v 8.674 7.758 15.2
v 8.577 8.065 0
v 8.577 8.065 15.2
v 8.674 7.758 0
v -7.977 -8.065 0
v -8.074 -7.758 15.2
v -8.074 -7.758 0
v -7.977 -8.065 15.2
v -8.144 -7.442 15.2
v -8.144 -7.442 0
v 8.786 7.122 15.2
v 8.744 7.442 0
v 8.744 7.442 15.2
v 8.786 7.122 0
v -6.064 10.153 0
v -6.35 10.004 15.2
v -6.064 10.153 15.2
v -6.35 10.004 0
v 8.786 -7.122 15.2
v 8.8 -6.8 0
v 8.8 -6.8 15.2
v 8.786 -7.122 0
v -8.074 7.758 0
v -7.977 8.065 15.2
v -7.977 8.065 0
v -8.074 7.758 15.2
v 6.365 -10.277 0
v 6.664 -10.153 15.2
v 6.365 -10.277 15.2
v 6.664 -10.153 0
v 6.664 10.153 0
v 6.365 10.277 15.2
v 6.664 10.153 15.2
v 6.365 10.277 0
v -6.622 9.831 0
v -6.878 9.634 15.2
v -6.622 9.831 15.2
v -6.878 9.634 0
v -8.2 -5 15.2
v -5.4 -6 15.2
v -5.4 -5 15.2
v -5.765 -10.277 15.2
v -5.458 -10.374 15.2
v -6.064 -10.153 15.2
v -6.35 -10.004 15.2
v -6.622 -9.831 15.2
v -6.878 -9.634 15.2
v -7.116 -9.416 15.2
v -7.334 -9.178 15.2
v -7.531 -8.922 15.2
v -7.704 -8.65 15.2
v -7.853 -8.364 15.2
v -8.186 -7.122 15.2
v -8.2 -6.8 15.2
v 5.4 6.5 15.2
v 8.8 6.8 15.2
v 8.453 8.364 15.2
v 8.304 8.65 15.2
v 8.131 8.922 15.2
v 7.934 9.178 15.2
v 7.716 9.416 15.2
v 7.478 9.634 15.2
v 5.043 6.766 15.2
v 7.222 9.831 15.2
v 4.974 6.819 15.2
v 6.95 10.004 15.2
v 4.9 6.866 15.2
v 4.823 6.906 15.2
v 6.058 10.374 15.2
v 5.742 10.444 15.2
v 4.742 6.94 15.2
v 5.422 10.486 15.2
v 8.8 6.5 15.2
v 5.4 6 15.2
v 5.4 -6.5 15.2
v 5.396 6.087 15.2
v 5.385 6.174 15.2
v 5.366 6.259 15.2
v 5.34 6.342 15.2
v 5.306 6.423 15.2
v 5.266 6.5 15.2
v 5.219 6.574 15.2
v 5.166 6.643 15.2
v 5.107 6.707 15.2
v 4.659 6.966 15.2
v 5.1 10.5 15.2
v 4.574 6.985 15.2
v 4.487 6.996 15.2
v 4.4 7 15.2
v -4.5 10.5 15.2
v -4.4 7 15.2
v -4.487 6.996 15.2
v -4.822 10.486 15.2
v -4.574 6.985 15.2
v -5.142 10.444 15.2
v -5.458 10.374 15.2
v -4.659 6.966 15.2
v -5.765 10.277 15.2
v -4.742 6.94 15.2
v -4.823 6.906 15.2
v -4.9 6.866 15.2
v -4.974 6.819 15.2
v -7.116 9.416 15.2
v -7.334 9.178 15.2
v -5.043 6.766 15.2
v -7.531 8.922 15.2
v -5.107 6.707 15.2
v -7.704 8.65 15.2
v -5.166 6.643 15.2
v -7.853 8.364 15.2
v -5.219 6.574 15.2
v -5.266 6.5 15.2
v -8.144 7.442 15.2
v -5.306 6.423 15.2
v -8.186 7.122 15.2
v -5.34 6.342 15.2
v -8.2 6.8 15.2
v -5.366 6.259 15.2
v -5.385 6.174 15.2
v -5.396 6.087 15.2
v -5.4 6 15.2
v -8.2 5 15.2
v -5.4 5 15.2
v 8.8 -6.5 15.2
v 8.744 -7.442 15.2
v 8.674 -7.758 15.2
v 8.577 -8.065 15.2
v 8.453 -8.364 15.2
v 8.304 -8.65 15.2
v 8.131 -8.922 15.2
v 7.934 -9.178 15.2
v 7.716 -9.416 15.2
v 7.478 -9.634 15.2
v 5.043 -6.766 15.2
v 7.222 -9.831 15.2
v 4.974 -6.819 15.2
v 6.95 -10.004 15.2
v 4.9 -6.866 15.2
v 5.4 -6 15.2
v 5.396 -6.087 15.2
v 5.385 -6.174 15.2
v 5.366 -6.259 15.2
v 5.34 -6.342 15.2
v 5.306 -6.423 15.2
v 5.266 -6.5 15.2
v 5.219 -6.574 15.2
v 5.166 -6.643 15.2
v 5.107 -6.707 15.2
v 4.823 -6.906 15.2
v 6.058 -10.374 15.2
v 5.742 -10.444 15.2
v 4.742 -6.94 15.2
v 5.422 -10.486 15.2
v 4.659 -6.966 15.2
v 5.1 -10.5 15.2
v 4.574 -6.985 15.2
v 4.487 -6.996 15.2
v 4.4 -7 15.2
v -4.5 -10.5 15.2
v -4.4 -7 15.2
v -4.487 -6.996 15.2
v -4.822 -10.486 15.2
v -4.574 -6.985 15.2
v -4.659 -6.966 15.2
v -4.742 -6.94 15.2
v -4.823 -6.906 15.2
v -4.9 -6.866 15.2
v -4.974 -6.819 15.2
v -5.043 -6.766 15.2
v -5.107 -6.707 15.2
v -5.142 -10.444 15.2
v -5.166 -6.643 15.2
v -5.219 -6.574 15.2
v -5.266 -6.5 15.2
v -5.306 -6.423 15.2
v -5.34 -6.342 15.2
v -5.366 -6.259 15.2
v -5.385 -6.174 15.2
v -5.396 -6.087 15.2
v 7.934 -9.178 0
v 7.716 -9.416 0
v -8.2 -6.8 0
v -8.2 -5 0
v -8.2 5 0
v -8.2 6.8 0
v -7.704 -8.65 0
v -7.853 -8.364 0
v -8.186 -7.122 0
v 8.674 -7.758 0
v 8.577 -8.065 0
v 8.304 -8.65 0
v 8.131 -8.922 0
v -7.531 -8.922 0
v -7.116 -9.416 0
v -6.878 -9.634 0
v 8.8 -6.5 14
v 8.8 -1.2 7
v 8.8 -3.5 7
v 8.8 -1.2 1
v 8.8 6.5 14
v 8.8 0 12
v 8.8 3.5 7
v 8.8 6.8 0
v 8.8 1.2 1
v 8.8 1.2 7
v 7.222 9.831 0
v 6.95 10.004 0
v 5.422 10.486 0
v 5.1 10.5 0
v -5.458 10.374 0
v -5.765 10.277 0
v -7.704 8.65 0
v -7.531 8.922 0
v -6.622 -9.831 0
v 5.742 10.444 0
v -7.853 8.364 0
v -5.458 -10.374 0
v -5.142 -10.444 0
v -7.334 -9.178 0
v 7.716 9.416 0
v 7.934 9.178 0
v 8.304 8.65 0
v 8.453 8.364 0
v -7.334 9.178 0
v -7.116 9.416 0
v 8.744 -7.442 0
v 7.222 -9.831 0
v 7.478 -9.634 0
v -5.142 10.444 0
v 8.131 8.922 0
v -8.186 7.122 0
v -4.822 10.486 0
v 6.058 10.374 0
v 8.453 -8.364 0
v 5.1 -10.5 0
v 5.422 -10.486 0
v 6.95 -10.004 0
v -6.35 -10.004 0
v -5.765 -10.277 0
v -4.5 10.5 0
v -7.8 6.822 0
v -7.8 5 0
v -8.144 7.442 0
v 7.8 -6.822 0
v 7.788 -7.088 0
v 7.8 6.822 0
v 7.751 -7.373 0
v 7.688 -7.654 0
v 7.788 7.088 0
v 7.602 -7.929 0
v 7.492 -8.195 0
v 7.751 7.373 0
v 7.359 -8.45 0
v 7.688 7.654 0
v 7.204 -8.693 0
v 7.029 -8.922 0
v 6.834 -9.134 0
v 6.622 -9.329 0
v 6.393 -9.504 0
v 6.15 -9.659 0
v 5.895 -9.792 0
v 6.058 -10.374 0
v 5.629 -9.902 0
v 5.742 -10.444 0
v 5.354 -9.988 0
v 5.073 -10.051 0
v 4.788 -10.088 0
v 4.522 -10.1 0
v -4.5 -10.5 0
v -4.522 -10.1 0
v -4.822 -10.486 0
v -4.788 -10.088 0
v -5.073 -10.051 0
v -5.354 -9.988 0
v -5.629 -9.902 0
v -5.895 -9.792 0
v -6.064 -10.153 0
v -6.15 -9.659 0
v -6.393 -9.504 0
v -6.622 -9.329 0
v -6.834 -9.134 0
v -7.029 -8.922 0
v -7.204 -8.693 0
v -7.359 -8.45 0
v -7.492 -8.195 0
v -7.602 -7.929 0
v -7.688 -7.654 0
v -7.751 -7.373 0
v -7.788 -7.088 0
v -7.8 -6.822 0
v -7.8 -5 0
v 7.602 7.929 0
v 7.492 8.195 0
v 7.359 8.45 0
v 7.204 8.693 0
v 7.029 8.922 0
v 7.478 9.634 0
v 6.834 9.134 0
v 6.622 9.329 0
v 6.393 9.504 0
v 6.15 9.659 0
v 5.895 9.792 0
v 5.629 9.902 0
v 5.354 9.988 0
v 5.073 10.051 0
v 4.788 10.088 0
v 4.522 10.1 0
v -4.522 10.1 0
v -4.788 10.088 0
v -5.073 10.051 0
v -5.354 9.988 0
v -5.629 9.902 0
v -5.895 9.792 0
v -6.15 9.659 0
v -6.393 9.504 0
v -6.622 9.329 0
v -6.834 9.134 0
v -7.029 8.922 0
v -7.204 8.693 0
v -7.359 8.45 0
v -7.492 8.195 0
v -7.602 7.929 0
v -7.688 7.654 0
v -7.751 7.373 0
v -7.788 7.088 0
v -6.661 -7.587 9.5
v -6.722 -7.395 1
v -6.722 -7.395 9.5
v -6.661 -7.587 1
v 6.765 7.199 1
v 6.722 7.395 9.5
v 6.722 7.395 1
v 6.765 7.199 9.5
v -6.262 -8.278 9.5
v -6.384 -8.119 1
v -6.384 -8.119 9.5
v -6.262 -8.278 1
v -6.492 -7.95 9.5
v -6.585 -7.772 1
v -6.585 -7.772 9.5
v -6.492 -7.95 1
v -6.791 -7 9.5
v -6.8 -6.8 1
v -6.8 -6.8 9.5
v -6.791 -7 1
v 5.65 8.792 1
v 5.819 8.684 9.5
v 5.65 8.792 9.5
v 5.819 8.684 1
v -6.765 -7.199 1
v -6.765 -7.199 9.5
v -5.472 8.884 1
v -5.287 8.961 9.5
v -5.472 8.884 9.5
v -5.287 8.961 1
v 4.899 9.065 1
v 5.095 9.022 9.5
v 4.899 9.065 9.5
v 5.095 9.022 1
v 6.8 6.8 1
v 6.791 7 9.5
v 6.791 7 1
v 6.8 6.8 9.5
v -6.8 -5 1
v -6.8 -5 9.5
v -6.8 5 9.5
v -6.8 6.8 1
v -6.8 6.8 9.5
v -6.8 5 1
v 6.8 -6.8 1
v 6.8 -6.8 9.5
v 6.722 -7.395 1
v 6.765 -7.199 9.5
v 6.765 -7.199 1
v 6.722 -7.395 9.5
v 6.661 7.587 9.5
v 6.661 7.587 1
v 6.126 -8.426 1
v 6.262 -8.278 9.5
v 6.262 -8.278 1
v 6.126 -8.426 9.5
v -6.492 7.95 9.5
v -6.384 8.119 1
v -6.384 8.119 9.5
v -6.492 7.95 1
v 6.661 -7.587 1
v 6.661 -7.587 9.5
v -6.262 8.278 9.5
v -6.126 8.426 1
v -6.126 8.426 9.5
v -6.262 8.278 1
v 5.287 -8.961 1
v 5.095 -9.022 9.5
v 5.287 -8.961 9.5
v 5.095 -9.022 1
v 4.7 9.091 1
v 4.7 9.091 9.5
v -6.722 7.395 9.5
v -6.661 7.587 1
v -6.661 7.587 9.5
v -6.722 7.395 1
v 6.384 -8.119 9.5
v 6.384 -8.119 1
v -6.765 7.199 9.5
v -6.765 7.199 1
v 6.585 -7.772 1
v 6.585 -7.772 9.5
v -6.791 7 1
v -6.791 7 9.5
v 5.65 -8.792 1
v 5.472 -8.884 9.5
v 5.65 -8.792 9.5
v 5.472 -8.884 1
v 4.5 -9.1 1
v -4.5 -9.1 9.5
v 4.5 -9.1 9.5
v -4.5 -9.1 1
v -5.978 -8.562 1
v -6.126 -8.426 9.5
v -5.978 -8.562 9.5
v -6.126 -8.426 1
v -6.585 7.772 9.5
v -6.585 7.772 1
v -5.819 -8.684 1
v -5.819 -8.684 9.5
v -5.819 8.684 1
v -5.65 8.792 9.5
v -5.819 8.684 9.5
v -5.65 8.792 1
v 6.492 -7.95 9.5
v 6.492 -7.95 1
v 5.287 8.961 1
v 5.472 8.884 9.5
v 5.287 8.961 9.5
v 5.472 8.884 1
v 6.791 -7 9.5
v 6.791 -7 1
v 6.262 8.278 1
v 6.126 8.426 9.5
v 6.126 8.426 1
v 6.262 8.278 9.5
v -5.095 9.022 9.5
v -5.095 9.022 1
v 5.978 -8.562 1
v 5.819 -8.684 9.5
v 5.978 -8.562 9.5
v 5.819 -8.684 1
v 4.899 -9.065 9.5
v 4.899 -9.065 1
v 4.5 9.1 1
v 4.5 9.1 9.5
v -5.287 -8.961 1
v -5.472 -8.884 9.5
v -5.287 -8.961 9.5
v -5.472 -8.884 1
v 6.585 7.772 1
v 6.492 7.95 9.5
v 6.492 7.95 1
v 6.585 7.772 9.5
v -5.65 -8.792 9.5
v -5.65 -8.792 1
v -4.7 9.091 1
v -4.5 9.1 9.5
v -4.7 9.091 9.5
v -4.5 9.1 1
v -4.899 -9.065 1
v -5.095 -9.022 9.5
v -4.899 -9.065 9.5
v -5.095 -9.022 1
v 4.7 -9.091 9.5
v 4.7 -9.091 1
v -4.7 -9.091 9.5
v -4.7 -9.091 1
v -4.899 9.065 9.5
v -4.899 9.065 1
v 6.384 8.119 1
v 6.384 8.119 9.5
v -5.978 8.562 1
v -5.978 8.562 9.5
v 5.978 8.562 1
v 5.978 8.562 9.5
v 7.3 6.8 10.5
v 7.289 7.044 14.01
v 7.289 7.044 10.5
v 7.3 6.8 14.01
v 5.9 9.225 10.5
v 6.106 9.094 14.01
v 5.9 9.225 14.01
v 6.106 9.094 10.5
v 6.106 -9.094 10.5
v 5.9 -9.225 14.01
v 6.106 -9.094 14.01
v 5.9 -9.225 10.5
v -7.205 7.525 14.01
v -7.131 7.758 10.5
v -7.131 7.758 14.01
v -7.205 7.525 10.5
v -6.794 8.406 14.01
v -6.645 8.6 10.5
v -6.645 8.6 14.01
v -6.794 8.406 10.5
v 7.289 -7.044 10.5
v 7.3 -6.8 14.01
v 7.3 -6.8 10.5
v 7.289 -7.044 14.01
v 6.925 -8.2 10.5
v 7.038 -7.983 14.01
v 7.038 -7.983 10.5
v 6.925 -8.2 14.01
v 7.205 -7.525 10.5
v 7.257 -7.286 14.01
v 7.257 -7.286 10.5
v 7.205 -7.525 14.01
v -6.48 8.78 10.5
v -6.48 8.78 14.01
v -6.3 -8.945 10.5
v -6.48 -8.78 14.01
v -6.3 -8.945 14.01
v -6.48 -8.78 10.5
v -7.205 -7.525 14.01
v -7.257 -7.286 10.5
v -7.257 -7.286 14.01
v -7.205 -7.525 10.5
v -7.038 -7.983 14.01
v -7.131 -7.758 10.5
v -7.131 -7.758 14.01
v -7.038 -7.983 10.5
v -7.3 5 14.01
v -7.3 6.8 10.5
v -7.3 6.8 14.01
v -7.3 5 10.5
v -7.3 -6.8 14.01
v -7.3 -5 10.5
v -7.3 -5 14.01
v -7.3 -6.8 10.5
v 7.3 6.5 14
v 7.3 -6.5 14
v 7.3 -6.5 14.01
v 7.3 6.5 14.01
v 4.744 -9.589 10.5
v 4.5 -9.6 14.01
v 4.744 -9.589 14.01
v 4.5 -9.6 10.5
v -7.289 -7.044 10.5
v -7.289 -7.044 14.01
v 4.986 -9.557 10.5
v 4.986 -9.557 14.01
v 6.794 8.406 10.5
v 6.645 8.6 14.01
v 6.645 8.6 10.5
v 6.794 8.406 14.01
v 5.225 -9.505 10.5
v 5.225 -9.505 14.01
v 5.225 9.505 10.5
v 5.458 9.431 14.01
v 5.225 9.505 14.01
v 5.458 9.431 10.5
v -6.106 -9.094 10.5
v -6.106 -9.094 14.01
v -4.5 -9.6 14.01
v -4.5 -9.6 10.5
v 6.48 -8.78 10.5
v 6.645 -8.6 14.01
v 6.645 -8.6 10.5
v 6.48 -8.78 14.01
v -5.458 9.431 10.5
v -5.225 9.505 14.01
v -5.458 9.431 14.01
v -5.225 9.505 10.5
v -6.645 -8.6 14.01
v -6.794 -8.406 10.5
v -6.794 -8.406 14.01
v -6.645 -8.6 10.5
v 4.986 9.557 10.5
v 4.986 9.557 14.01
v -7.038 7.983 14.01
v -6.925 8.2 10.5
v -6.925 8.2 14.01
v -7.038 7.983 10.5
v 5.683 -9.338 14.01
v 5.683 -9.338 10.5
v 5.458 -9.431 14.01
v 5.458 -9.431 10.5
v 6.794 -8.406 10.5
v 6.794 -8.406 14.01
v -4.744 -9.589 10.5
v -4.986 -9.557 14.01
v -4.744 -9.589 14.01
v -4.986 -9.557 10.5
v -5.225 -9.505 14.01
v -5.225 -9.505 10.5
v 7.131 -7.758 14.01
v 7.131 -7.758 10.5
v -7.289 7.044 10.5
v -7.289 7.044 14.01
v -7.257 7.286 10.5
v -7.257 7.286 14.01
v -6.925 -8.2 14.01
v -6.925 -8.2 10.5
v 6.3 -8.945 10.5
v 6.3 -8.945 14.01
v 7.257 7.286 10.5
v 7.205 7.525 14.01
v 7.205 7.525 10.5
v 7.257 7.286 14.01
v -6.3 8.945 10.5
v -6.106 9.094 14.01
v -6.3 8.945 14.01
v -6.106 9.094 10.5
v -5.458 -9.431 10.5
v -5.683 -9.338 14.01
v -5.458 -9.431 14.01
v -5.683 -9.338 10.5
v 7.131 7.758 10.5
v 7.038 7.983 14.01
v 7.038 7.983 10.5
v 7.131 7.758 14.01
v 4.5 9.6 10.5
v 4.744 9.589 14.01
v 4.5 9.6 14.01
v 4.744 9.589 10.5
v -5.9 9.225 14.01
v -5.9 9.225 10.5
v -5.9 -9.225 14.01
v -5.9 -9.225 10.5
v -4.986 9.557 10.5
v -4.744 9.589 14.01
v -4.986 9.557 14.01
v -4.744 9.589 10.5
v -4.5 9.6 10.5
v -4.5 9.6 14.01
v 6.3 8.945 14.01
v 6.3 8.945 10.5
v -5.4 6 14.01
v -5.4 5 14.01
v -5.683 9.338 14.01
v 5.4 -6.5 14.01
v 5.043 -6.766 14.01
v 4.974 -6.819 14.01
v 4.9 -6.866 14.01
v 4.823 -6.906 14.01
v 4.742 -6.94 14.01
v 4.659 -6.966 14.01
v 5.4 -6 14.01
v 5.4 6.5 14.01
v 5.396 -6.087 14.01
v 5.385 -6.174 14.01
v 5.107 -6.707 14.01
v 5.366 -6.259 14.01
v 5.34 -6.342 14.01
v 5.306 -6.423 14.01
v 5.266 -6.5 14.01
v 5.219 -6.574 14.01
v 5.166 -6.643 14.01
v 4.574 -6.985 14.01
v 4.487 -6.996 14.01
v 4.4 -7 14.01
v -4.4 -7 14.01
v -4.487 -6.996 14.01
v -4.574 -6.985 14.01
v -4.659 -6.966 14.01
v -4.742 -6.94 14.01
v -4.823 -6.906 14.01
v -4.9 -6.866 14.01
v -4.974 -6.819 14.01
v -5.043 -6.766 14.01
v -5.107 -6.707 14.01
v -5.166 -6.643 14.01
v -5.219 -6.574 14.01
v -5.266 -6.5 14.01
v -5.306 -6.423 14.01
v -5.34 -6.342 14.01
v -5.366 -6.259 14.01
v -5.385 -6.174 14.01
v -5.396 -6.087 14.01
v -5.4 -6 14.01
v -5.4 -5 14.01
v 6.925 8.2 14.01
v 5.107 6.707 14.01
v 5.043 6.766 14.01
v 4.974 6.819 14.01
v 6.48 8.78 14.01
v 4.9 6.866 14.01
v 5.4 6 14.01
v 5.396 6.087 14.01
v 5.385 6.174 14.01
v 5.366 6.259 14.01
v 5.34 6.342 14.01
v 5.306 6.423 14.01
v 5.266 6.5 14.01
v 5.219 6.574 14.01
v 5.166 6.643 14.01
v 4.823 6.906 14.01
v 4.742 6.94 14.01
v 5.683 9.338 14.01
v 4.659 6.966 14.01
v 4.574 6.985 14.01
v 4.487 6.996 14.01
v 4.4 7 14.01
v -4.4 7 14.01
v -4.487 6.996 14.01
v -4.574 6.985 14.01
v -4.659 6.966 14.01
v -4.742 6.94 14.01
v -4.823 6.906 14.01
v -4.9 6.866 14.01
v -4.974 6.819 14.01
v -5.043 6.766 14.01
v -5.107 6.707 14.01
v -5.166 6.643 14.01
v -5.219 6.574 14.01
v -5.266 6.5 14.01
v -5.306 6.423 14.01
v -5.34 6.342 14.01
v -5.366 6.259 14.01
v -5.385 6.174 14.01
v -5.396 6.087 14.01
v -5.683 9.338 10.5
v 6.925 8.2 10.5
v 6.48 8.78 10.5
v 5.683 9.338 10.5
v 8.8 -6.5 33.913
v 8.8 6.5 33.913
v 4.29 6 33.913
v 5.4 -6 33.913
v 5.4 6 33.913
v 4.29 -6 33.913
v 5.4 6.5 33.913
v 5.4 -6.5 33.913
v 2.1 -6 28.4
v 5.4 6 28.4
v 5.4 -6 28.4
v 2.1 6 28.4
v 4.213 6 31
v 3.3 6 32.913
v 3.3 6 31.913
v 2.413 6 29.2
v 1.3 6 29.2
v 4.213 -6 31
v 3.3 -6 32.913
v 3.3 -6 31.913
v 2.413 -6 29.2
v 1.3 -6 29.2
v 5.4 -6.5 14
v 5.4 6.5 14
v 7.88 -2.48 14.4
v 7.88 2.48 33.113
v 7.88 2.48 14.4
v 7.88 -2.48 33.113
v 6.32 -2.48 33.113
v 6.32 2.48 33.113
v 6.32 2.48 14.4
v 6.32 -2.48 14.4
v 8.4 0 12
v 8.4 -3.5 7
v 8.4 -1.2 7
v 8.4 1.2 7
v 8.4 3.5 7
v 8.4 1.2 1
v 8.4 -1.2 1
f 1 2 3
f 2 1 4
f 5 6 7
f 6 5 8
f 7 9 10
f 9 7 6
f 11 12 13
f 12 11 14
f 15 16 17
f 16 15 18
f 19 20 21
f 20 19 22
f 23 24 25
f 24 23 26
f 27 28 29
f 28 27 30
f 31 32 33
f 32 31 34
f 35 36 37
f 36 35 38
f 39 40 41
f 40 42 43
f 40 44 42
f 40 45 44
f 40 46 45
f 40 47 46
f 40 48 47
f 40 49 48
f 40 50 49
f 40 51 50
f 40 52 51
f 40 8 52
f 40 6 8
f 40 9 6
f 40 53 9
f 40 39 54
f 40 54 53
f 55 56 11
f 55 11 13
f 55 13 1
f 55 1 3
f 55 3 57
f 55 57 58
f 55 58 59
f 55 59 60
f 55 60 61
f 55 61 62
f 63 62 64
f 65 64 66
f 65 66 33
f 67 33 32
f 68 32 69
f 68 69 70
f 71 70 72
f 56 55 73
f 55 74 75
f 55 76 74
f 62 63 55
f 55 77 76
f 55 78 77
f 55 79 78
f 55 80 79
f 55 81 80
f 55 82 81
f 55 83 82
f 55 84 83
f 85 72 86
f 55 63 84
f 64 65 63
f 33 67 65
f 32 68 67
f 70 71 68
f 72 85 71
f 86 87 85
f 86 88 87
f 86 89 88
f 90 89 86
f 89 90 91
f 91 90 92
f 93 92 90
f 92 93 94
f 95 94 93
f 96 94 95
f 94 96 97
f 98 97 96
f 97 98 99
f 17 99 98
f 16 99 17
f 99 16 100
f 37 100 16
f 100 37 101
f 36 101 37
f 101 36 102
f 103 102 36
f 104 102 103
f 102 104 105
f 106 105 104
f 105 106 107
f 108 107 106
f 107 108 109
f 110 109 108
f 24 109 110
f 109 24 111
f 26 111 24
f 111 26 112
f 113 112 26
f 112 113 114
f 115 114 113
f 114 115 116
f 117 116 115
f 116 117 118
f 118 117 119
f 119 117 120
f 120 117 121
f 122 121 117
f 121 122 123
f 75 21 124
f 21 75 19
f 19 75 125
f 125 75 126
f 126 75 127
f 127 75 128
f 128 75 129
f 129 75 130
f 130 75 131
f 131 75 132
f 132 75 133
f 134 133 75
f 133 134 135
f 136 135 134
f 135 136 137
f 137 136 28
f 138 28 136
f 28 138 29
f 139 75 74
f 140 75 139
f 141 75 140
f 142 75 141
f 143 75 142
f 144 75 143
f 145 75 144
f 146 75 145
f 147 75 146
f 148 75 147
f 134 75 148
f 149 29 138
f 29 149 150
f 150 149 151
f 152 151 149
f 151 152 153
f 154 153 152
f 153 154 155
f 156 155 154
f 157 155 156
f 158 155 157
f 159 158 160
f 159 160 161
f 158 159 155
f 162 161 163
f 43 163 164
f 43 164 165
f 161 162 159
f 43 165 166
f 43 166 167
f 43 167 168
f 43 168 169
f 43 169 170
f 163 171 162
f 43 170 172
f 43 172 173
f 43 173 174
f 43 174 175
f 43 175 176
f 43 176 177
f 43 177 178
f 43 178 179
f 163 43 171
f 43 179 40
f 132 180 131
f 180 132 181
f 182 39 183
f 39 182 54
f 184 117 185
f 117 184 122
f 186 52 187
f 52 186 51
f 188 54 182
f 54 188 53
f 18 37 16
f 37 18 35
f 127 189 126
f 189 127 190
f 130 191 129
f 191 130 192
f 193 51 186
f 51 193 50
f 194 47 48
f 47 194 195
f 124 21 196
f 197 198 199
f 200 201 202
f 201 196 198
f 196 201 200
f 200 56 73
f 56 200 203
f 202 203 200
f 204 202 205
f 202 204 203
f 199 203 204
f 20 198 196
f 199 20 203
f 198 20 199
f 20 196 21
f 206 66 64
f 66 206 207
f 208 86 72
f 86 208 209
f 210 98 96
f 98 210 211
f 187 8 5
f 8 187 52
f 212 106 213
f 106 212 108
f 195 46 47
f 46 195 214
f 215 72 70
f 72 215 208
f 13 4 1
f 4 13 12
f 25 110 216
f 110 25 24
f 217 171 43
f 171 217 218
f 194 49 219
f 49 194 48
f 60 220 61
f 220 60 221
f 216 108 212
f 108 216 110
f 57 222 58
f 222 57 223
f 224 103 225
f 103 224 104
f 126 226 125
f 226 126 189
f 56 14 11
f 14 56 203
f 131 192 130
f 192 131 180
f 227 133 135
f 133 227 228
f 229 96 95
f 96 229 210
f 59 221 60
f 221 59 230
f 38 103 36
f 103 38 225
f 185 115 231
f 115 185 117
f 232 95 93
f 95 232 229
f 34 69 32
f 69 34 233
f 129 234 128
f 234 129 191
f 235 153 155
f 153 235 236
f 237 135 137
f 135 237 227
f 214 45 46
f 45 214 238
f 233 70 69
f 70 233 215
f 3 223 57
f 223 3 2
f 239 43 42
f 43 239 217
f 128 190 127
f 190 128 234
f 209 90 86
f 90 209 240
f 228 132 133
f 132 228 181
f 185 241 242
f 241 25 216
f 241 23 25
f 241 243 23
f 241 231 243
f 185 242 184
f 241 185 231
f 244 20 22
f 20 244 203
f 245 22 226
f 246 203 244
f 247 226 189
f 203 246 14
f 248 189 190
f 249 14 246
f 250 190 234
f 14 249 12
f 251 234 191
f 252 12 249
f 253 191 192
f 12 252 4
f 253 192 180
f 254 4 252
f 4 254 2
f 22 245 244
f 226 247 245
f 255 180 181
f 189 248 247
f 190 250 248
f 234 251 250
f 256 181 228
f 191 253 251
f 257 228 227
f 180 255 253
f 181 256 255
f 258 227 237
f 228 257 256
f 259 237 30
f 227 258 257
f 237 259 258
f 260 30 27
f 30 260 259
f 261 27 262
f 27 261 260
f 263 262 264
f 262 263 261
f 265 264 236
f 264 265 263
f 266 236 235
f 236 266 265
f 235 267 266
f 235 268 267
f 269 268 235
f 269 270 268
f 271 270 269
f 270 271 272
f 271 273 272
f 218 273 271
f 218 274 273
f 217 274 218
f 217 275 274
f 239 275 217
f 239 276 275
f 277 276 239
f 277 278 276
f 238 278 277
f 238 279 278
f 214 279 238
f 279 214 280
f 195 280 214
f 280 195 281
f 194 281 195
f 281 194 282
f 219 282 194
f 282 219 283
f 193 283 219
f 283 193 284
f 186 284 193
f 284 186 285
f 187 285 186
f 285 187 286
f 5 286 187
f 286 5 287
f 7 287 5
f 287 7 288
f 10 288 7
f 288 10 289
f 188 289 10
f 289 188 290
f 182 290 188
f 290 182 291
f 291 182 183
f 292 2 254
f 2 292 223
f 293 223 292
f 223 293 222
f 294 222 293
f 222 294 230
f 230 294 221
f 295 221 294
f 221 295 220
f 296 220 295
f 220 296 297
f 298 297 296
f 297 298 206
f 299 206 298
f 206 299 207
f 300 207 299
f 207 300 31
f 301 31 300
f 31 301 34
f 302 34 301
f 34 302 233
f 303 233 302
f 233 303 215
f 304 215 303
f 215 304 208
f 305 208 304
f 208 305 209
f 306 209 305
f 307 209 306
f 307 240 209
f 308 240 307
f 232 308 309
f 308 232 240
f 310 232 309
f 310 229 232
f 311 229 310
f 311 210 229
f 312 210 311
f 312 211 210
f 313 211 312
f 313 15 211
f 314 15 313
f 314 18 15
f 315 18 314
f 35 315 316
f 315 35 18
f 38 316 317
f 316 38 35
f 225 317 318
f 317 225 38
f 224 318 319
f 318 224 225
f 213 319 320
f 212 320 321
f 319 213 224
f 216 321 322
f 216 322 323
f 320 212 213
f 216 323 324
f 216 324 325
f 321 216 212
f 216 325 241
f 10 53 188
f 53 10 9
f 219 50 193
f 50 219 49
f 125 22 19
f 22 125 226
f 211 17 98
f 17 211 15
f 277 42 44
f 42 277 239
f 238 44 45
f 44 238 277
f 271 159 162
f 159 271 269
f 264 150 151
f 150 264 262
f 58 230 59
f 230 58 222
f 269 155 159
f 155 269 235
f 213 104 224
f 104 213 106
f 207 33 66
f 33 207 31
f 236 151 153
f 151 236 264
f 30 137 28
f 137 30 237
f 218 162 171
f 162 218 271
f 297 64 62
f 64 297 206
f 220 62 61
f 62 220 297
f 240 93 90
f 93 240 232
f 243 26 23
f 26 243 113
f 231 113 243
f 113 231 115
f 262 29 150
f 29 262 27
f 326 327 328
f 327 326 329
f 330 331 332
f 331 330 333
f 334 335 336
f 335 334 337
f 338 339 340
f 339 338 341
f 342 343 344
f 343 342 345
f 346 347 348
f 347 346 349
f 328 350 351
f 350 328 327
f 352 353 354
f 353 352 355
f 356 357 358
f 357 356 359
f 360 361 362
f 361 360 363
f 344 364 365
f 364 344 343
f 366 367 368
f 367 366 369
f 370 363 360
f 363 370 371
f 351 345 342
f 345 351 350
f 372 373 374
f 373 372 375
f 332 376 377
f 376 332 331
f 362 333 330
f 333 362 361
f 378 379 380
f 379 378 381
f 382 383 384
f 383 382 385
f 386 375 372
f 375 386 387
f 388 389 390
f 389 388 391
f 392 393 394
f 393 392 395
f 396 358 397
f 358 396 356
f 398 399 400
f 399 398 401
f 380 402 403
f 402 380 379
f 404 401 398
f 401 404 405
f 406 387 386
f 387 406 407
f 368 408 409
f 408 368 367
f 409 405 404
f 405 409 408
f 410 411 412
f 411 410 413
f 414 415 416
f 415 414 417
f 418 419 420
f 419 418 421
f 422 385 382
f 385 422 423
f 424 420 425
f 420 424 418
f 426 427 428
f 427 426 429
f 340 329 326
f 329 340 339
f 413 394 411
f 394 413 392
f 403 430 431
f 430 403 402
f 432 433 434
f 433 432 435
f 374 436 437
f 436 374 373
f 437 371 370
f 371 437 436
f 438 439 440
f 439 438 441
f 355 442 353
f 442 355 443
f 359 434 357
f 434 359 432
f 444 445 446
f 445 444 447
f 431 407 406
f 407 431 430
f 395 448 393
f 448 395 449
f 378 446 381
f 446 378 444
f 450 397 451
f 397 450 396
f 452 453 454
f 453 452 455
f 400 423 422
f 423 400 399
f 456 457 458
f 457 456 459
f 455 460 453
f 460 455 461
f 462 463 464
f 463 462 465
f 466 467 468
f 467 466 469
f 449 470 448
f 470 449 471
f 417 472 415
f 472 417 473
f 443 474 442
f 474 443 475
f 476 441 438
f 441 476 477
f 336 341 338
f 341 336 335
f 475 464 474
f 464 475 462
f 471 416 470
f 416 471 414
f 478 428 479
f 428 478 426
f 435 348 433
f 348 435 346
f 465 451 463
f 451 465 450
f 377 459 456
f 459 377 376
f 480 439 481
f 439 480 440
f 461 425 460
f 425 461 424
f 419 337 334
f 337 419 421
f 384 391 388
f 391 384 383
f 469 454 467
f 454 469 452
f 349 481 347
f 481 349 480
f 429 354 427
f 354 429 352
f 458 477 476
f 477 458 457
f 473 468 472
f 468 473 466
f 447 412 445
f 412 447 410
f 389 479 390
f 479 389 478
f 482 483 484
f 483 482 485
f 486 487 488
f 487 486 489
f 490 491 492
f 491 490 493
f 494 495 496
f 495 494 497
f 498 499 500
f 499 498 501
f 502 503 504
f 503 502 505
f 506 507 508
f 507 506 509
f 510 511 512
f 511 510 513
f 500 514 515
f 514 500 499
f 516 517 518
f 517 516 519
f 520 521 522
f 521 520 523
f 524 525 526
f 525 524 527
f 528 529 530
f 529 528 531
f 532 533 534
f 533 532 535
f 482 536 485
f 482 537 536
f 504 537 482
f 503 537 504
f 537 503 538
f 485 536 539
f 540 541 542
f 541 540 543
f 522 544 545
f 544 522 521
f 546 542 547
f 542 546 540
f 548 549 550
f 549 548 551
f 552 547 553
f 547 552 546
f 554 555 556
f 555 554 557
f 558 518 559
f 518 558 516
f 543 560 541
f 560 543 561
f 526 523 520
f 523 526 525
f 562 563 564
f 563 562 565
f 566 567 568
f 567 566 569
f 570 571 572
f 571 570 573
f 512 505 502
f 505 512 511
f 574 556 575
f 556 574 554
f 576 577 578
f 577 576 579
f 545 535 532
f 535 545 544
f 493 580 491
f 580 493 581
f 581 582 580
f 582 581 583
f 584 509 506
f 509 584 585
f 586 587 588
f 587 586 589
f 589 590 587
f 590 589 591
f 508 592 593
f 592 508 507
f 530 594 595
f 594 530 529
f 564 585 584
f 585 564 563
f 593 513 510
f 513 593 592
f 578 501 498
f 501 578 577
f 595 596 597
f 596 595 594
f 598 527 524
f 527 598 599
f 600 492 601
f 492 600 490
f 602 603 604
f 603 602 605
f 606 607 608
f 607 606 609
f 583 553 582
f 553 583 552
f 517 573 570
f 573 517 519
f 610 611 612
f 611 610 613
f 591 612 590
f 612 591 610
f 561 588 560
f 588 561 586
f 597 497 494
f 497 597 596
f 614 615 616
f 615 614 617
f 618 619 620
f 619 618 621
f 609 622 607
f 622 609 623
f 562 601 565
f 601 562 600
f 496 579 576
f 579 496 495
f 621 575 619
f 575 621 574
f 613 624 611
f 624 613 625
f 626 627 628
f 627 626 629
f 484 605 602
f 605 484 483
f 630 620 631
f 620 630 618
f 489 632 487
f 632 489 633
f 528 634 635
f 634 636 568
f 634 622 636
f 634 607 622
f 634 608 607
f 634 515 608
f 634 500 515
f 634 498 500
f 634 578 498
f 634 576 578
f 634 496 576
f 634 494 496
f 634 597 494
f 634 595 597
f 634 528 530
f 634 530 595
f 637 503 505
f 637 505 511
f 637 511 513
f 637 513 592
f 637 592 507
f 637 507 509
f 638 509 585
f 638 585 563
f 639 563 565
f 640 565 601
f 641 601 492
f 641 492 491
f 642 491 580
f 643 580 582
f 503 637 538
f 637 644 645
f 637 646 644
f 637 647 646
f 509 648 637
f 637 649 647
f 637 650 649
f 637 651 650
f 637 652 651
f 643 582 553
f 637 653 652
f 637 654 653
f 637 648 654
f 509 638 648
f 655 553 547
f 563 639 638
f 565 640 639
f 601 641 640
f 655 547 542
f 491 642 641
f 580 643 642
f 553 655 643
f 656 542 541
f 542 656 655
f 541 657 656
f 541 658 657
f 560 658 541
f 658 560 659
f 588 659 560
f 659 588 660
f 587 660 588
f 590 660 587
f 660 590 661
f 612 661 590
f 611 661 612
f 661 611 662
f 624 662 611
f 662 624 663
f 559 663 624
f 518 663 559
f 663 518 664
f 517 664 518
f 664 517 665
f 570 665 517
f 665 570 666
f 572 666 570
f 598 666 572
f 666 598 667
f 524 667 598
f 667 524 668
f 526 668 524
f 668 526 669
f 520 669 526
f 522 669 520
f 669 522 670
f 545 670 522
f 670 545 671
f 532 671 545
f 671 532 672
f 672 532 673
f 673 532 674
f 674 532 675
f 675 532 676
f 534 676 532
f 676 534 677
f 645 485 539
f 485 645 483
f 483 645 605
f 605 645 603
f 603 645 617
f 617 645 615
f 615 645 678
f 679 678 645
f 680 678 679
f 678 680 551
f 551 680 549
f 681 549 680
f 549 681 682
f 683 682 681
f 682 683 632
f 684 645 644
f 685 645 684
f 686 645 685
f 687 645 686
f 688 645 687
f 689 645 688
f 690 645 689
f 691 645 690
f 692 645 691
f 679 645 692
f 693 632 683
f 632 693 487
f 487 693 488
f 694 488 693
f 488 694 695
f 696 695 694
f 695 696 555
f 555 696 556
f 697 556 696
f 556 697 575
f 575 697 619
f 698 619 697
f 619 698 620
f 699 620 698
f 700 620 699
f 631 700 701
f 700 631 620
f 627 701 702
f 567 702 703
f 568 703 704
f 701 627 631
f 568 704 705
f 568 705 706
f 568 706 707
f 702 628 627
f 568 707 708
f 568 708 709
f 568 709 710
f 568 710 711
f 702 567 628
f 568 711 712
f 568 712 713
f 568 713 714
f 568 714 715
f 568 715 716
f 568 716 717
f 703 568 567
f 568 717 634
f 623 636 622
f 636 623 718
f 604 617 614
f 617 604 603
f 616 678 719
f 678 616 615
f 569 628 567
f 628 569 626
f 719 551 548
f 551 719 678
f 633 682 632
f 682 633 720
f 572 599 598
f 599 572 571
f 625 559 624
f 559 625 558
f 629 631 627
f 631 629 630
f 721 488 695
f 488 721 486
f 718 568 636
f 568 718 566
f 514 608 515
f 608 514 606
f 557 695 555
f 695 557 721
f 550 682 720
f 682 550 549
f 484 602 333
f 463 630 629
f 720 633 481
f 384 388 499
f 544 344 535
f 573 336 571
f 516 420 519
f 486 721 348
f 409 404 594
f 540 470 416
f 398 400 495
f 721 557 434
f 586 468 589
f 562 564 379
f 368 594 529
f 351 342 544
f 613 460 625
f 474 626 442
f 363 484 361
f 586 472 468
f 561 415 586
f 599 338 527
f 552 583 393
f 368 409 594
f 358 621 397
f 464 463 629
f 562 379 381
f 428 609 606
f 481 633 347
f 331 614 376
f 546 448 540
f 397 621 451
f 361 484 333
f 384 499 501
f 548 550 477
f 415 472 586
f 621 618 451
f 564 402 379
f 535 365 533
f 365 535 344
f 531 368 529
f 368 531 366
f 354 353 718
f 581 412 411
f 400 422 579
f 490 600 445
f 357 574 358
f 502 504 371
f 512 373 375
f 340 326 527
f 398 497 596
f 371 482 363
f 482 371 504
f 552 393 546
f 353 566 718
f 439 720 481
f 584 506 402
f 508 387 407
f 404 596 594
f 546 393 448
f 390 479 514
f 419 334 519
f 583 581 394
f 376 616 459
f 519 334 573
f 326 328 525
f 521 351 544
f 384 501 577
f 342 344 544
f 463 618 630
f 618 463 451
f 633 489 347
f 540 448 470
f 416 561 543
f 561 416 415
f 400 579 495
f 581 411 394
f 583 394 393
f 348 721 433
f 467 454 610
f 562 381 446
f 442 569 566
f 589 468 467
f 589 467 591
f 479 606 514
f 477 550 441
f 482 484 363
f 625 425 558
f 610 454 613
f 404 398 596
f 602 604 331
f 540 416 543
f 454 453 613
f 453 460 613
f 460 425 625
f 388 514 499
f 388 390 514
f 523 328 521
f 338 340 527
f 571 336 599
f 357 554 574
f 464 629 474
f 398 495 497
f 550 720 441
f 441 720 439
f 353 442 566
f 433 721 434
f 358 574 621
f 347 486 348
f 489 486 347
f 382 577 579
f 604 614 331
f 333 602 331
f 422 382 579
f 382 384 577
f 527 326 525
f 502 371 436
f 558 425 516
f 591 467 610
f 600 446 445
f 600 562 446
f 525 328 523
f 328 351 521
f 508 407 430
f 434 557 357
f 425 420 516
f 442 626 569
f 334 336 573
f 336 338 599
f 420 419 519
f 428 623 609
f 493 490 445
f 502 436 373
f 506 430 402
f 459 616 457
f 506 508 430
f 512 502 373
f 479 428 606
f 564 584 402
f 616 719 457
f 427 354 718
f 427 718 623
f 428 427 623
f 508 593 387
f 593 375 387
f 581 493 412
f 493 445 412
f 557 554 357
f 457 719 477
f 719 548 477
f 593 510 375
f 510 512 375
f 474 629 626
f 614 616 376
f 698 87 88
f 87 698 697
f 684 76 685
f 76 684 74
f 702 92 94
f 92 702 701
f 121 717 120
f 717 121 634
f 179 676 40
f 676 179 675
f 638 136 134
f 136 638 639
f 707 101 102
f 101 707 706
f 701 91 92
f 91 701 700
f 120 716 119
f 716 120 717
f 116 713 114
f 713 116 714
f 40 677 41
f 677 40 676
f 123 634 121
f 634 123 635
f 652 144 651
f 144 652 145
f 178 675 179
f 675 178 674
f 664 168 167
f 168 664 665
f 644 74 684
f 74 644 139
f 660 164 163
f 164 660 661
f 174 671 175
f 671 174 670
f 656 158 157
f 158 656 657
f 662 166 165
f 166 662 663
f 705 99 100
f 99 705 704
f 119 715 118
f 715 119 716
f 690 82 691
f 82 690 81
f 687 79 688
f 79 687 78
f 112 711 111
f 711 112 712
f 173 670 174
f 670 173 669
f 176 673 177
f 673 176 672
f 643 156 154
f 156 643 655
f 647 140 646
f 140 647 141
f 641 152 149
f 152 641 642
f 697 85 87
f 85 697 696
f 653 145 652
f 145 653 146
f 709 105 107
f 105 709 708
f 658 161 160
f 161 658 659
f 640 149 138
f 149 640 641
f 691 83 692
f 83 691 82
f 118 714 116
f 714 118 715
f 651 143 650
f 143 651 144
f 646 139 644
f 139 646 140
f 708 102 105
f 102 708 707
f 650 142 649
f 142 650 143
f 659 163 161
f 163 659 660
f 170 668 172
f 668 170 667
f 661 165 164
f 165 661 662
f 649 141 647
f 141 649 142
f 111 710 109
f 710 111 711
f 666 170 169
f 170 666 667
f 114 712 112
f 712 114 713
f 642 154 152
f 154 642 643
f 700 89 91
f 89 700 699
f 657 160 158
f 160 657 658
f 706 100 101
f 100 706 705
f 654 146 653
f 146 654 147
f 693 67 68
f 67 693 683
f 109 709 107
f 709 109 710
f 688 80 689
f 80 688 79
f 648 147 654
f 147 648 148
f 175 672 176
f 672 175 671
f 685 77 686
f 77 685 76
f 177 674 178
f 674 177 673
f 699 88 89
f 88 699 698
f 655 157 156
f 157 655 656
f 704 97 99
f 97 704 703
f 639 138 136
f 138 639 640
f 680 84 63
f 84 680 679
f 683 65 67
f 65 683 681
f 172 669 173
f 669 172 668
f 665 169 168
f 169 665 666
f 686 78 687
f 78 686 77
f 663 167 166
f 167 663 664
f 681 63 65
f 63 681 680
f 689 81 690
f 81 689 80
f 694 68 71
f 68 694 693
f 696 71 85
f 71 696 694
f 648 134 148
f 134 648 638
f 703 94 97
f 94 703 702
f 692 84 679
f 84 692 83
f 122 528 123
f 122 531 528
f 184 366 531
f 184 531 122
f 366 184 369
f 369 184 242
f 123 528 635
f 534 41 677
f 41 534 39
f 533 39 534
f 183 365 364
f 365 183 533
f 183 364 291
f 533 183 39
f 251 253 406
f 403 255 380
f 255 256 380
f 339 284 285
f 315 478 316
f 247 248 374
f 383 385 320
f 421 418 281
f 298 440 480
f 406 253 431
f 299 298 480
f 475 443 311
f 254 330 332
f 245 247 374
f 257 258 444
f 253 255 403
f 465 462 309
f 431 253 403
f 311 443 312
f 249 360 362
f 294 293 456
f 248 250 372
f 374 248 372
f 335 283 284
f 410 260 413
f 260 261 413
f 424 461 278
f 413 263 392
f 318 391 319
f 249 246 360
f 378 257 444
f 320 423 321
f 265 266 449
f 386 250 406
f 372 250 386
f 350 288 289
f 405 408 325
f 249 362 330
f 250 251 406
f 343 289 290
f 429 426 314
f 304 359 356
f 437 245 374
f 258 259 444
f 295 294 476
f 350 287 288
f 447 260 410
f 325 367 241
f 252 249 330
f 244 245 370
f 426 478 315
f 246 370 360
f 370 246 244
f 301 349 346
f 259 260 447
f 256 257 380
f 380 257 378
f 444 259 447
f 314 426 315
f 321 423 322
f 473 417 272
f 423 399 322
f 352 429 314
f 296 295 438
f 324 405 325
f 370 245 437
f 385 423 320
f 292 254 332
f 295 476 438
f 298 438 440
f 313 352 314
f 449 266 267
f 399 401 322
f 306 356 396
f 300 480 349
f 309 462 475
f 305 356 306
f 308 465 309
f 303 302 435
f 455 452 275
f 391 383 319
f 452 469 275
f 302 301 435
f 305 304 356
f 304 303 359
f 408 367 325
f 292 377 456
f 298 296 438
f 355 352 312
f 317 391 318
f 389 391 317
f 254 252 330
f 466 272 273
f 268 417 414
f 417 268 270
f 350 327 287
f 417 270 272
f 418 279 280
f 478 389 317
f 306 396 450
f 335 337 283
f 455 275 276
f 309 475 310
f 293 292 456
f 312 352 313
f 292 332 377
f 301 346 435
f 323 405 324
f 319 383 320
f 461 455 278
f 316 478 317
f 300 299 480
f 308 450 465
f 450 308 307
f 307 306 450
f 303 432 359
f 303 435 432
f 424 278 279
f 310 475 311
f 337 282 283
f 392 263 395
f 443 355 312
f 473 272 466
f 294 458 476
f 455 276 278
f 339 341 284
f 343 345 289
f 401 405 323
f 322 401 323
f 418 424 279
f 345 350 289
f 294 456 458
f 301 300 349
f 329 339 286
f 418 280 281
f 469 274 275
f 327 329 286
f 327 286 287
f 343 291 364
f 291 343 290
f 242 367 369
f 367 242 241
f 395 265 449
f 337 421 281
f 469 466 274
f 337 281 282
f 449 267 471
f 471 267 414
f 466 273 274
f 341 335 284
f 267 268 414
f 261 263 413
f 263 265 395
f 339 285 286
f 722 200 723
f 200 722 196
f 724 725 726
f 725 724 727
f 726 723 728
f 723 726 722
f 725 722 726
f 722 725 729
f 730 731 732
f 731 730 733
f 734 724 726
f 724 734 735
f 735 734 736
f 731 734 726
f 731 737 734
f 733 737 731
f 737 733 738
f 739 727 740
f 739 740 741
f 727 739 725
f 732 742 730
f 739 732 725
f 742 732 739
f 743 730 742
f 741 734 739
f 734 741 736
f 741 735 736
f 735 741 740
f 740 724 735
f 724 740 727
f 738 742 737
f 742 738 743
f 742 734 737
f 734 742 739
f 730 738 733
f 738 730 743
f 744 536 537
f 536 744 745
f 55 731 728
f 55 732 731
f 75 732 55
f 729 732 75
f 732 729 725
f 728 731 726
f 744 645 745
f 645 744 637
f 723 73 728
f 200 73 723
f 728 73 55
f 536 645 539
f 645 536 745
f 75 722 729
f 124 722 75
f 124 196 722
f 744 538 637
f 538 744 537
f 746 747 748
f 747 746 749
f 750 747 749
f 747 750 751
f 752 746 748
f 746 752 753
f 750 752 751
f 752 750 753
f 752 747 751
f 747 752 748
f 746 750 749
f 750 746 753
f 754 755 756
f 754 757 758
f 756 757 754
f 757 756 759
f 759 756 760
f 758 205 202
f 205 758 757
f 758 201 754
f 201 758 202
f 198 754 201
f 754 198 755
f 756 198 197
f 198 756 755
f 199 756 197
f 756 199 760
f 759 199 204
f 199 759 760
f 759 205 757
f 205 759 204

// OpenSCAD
// HIOKI 3481 用 IV線保持ジグ（着脱式） v17.2
// ※ 日置電機（HIOKI）の非公式品です。メーカーとは関係ありません。
// ※ 使用前後に必ず既知の活線で検電器の動作を確認してください。使用は自己責任でお願いします。
//
// ・先端ノーズ（センサー部）の「側面」に、IV線を軸と直交させて当てる
// ・IV線はノーズとジグのV溝で挟み込み、爪でパチッと保持（機器に接続したままの線でOK）
// ・IV 1.6mm（外径3.2）と IV 2.0mm（外径3.4）の両方に対応
// ・本体先端のリブ（透明部と黒い部分のつなぎ目）をスリーブ内の溝に収めて、前後方向をカチッと固定
// ・スリーブのボタン面側は窓で開放（楕円部とON/OFFボタンを覆わない）。窓の両側の爪は本体のボタン面に広く掛かる
// ・IV線がノーズを押す力で本体がボタン面側の爪に押し付けられ、その摩擦で検電器と線の両方を保持する（v7〜v13で実績）
// ・取り付けは後ろからの差し込みのみ。背中の矢印と、後端の面取りで差し込む向きを示す
//
// 座標：Z軸 = 検電器の軸方向（+Z が先端側）、IV線は Y方向、線とアームは +X側
// ★印はノギスで実測して置き換える値
//
// 使い方：
//  1. 検電器の先端を、スリーブの後ろ（面取りしてある口）から差し込み、ツバに当たるまで押し込む
//     ※ ボタン面側から横に押し込むと爪が割れるので不可
//  2. 検電器の先端を上に向け、IV線に下から押し当ててノーズの横のV溝にはめる（パチッと爪を越える）
//  3. 検電（手を離した状態でも検知できるよう、検電器の感度は各自で調整・確認すること）
//  4. 外すときは検電器を下へ引いて線をV溝から外してから、検電器をスリーブの後ろへ抜く
//
// 補強材：結束バンド（ヘラマンタイトン AB300、幅4.9×厚1.5mm）を切ってアーム内のポケットに埋め込む
//         印刷中に一時停止して差し込む（高さはコンソールの ECHO に表示）
// 印刷の向き：スリーブを下にして立てる（寝かせるとPLAで爪が一発で割れた。アームの根元は要経過観察）

$fn = 72;

// ---- 線を当てる面 ----
// "label"  : ラベル面側（アームもラベル面側。ボタン面は開放のまま）
// "narrow" : 側面（幅の狭い面）側
// "button" : ボタン面側（アームが楕円部・ボタンの上を通るので非推奨）
wire_face = "label";   // 現行版は "label" のみ対応

// ---- 検電器本体（先端側の黒い部分の断面）----
body_w  = 17.0;  // 幅（ボタン面の横幅）実測
body_d  = 13.0;  // 厚み（ボタン面〜ラベル面）実測
body_r  = 2.0;   // 角の丸みの半径 実測
clr     = 0.3;   // 片側クリアランス
clr_d   = 0.3;   // 厚み方向（ボタン面〜ラベル面）の片側すき間。増やすとV溝も同じだけ自動で外へずれる
w_extra = 0.6;   // 幅方向だけ追加する余裕（合計）。試作4回目でスリーブが広がったため
rib_w   = 18.0;  // 先端リブの幅 実測
rib_d   = 14.0;  // ★ 先端リブの厚み（本体13mm + 0.5mm×2 と想定）
rib_len = 3.5;   // 先端リブの受け溝の前後方向の長さ（試作5回目の現物合わせで 2.0→3.5）
rib_ch  = 1.0;   // リブ受け溝の後ろ側の段差を斜めにする長さ（外すときにリブが乗り上げやすく）。0で段差のまま
cap_w   = 13.4;  // 透明キャップ根元の幅（外形図）。ツバの穴＝これ+0.6 で、リブ前側の輪(幅16.3)に当たる
cap_d   = 10.2;  // ツバの穴・アーム内面の基準（キャップのラベル面側は中心から5.0mm：外形図）

// ---- 先端キャップ ----
tip_len   = 22.0; // リブ前面〜ノーズ頂点の距離（外形図）
nose_d    = 6.0;  // ノーズの幅（外形図：5.3〜6.0）
nose_t    = 1.9;  // ノーズの厚み（外形図。平たい板状）
nose_off  = 8.8;  // 本体ボタン面〜ノーズのラベル面側の面（外形図。参考表示にのみ使用）
nose_x    = 0.5;  // V溝の位置決めに使うノーズ面のX（v7〜v13の現物合わせで実績のある値）
nose_len  = 8.2;  // ノーズ（細い部分＋根元の丸み）の長さ（外形図：細い部分6.7＋丸み）
nose_tip_r = 2.0; // ★ ノーズ頂点の丸みの半径（目安。線はこれより根元側に当てる）
contact_h = 5.0;  // ノーズ頂点〜IV線の中心までの距離（v8〜v14 と同じ実位置。tip_len 補正分を移した）

// ---- IV線 ----
wire_min  = 3.2;  // 対応する最小の線径（IV 1.6mm 実測）
wire_max  = 3.4;  // 対応する最大の線径（IV 2.0mm 実測）
squeeze   = 0.15; // 細い線をノーズへ押し付ける量（太い線はこれ + 約0.25mm）。v7〜v13と同じ
open_gap  = 2.8;  // 爪の先端〜ノーズ面の入口幅（wire_min より小さく。小さいほど保持が強い）

// ---- スリーブ ----
sleeve_len = 14.0; // スリーブ長さ
wall       = 1.4;  // 側面・爪の肉厚（すき間 0.3〜0.6mm と合わせて、仕上がりで約2mm）
wall_back  = 2.0;  // 背中（ラベル面側）の肉厚。アームの根元になるので厚め
win_w      = 10.0; // ボタン面側の窓の幅（楕円部の幅9.3 + 余裕）。爪が本体ボタン面に広く掛かる
rear_ch    = 1.0;  // スリーブ後端の内側の面取り（差し込み口の目印＆入れやすく）
arrow_d    = 0.4;  // 背中に彫る矢印（差し込む向き）の深さ
flange_t   = 1.2;  // 先端ツバの厚み

// ---- 線受けブロック・アーム ----
bar_t    = 12.0; // ブロックの幅（線に沿った長さ）
arm_w    = 13.0; // アームの幅（背中の平らな部分いっぱい）

// ---- 補強材（結束バンド）----
use_rib    = true; // false にするとポケットなし（v16と同じ形）
tie_w      = 4.9;  // 結束バンドの幅（実測）
tie_t      = 1.5;  // 結束バンドの厚み（実測）
tie_clr    = 0.03; // ポケットの片側すき間（0.15ではスカスカだった。押し込んで入るくらいを狙う）
tie_floor  = 0.4;  // ポケットの底（ツバの上）の厚み
tie_roof   = 0.8;  // ポケットのフタの厚み（ブロック上面からの残り）
gap      = 0.4;  // ノーズとブロックのすき間
wall_t   = 2.5;  // V溝の奥の壁厚
ledge_t  = 0.8;  // 線の下（本体側）の受け厚
ledge_dz = 1.8;  // 線の中心〜受け面の高さ
lip_h    = 2.0;  // 爪の先端より上の厚み
lead     = 1.0;  // 入口の面取り
low_ch   = 1.2;  // ブロック下面・ノーズ側の角の面取り（テーパー部との干渉よけ）
arm_t    = 9.9;  // アーム厚みの上限（実際は透明キャップに当たらない厚みに自動で制限）

// ---- 導出値 ----
rot   = wire_face == "label" ? 90 : wire_face == "button" ? -90 : 0;
in_w  = body_w + 2*clr + w_extra;
in_d  = body_d + 2*clr_d;
hx    = in_d/2 + wall_back;                          // 背中（ラベル面側）の外面X
nose_r = nose_d/2;
z_bf   = sleeve_len;                                  // 本体先端面のZ（ツバの裏）
z_top  = z_bf + tip_len;                              // ノーズ頂点
z_sh   = z_top - nose_len;                            // ノーズの肩
z_c    = z_top - contact_h;                           // 線の中心高さ
// 本体は線の力でボタン面側の爪に押し付けられるので、厚み方向のすき間を増やすとノーズもその分ずれる。
// v16（clr_d=0.3）を基準に、V溝も同じだけずらして押し付け量を保つ
xn     = nose_x + (clr_d - 0.3);                       // 線を当てるノーズ面のX
// 90°のV溝：頂点 xa。直径dの線は中心が頂点から d/2*√2 の位置に来る
xa     = xn - squeeze + wire_min*(0.5 + sqrt(2)/2);   // V溝の頂点X
function wx(d) = xa - d/2*sqrt(2);                     // 直径dの線の中心X
x_in   = xn + gap;                                    // ブロックのノーズ側の面
x_l    = xn + open_gap;                               // 爪の先端X
z_lip  = z_c + (xa - x_l);                            // 爪の先端Z
blk_z0 = z_c - ledge_dz - ledge_t;
blk_z1 = z_lip + lip_h;
arm_x1 = hx;                                          // アーム外面＝スリーブ外面（面一）
arm_x0 = max(hx - arm_t, cap_d/2 + 0.3);                // キャップ根元 + 0.3mm まで
echo(str("IV1.6 の食い込み = ", xn - (wx(wire_min) - wire_min/2), " mm / IV2.0 の食い込み = ", xn - (wx(wire_max) - wire_max/2), " mm"));

assert(blk_z0 > z_sh - 0.5, "線の受けがノーズの肩（テーパー部）に当たる：contact_h を小さくするか ledge_t を薄く");
assert(xa + wall_t <= arm_x1, "V溝の奥の壁がスリーブ外面より外に出る：wall_t を薄く");
// 補強材ポケット（アーム厚みの中央、ツバの上〜線受けブロックの中まで）
pk_t   = tie_t + 2*tie_clr;
pk_w   = tie_w + 2*tie_clr;
pk_x0  = (arm_x0 + arm_x1)/2 - pk_t/2;
pk_z0  = sleeve_len + tie_floor;
pk_z1  = blk_z1 - tie_roof;
if (use_rib) {
    echo(str("補強材：結束バンドを ", floor((pk_z1 - pk_z0 - 0.2)*10)/10, " mm に切る / 一時停止の高さ = ", pk_z1, " mm（この高さを超える最初の層の前で止める）"));
    echo(str("ポケット両側の肉厚 = 内側 ", pk_x0 - arm_x0, " mm / 外側 ", arm_x1 - (pk_x0 + pk_t), " mm"));
}
echo(str("アーム厚み = ", arm_x1 - arm_x0, " mm / 爪がボタン面に掛かる幅(片側) = ", (in_w - win_w)/2, " mm"));
assert(wire_face == "label", "v14 は wire_face = \"label\" のみ対応");
assert(arm_w <= in_w - 2*(body_r + clr), "arm_w が背中の平らな部分より広い");
assert(open_gap < wire_min, "open_gap は wire_min より小さくすること");
assert(contact_h >= nose_tip_r, "線がノーズの丸い頂点にかかる：contact_h を大きく");

module body_frame() { rotate([0, 0, rot]) children(); }
module rrect(w, d, rr) { offset(r = rr) square([w - 2*rr, d - 2*rr], center = true); }

// 本体座標（幅がX、ボタン面が+Y、ラベル面が-Y）で作ってから治具座標へ回す
module sleeve() {
    zt = sleeve_len + flange_t;
    body_frame() difference() {
        // 外形：背中（-Y）だけ wall_back、ほかは wall
        translate([0, -(wall_back - wall)/2, 0])
            linear_extrude(zt) rrect(in_w + 2*wall, in_d + wall + wall_back, body_r + clr + wall);
        // 本体が入る空洞
        translate([0, 0, -1]) linear_extrude(sleeve_len + 1) rrect(in_w, in_d, body_r + clr);
        // 先端リブの受け溝（リブはラベル面側にも0.5mm出ているので背中側も逃がす。背中は wall_back で厚みを確保）
        translate([0, 0, sleeve_len - rib_len]) linear_extrude(rib_len + 0.01) intersection() {
            rrect(rib_w + 2*clr + w_extra, rib_d + 2*clr, body_r + 0.5 + clr);
            translate([-50, -50]) square([100, 100]);
        }
        // 受け溝の後ろ側の段差を面取り（溝の寸法 → 空洞の寸法へ斜めにつなぐ）
        if (rib_ch > 0) hull() {
            translate([0, 0, sleeve_len - rib_len]) linear_extrude(0.01)
                rrect(rib_w + 2*clr + w_extra, rib_d + 2*clr, body_r + 0.5 + clr);
            translate([0, 0, sleeve_len - rib_len - rib_ch]) linear_extrude(0.01)
                rrect(in_w, in_d, body_r + clr);
        }
        // ツバの内側の穴（透明キャップ根元 + 0.3mm）
        translate([0, 0, sleeve_len - 1]) linear_extrude(flange_t + 2) rrect(cap_w + 0.6, cap_d + 0.6, 1.0);
        // ボタン面側の窓（スリーブ全長＋ツバ。楕円部・LED部が通る）
        translate([-win_w/2, 0, -1]) cube([win_w, 50, zt + 2]);
        // 後端の差し込み口の面取り
        translate([0, 0, -0.01]) hull() {
            linear_extrude(0.01) offset(delta = rear_ch) rrect(in_w, in_d, body_r + clr);
            translate([0, 0, rear_ch]) linear_extrude(0.01) rrect(in_w, in_d, body_r + clr);
        }
    }
}

// アームはツバの位置から立ち上げる（スリーブ部分はスリーブの壁がそのまま背骨になる）
module arm() { translate([arm_x0, -arm_w/2, sleeve_len]) cube([arm_x1 - arm_x0, arm_w, blk_z1 - sleeve_len]); }

module block() {
    difference() {
        translate([x_in, -bar_t/2, blk_z0]) cube([arm_x1 - x_in, bar_t, blk_z1 - blk_z0]);
        // V溝＋受け面＋入口（XZ断面をY方向に押し出して抜く）
        translate([0, bar_t/2 + 1, 0]) rotate([90, 0, 0]) linear_extrude(bar_t + 2)
            polygon([
                [x_in - 1,          z_c - ledge_dz],   // 受け面（ノーズ側）
                [xa - ledge_dz,     z_c - ledge_dz],   // 受け面 → V溝の下面
                [xa,                z_c],              // V溝の頂点
                [x_l,               z_lip],            // V溝の上面 → 爪の先端
                [x_l,               blk_z1 - lead],    // 爪の前面
                [x_l + lead,        blk_z1 + 0.01],    // 入口の面取り
                [x_in - 1,          blk_z1 + 0.01]
            ]);
        // 下面のノーズ側の角を面取り
        translate([0, bar_t/2 + 1, 0]) rotate([90, 0, 0]) linear_extrude(bar_t + 2)
            polygon([[x_in - 1, blk_z0 - 1], [x_in + low_ch + 1, blk_z0 - 1], [x_in - 1, blk_z0 + low_ch + 1]]);
    }
}

// 背中（ラベル面側の外面）に、差し込む向き（後ろ→先端）の矢印を彫る
module arrow2d() { polygon([[-1.2, 1], [1.2, 1], [1.2, 7], [3.5, 7], [0, 12], [-3.5, 7], [-1.2, 7]]); }
difference() {
    union() { sleeve(); arm(); block(); }
    if (use_rib) translate([pk_x0, -pk_w/2, pk_z0]) cube([pk_t, pk_w, pk_z1 - pk_z0]);
    translate([hx - arrow_d, 0, 0]) rotate([90, 0, 90]) linear_extrude(arrow_d + 1) arrow2d();
}

// ---- 参考表示（% 付き：プレビューのみ、STLには含まれない）----
%translate([wx(wire_max), -30, z_c]) rotate([-90, 0, 0]) cylinder(d = wire_max, h = 60);   // IV線（2.0mm）
// 検電器（外形図からの概形）。本体座標：ボタン面+Y、ラベル面-Y
%body_frame() {
    translate([0, 0, z_bf - 60]) linear_extrude(60) rrect(body_w, body_d, body_r);
    translate([0, 0, z_bf]) linear_extrude(3.3) rrect(rib_w, rib_d, body_r + 0.5);
    // テーパー部（ラベル面側は中心から5.0→4.5、ボタン面側は4.4→2.2、幅13.4→10.5）
    hull() {
        translate([0, -0.3, z_bf]) linear_extrude(0.1) translate([-6.7, -5.0]) square([13.4, 9.4]);
        translate([0, 0, z_top - 8.2]) linear_extrude(0.1) translate([-5.25, -4.4]) square([10.5, 6.6]);
    }
    // ノーズ（幅 nose_d × 厚み nose_t、ラベル面側へ寄っている）
    translate([0, body_d/2 - nose_off + nose_t/2, z_top - nose_len])
        hull() {
            translate([0, 0, 0]) linear_extrude(nose_len - nose_d/2) square([nose_d, nose_t], center = true);
            translate([0, 0, nose_len - nose_d/2]) scale([1, nose_t/nose_d, 1]) sphere(d = nose_d);
        }
}
